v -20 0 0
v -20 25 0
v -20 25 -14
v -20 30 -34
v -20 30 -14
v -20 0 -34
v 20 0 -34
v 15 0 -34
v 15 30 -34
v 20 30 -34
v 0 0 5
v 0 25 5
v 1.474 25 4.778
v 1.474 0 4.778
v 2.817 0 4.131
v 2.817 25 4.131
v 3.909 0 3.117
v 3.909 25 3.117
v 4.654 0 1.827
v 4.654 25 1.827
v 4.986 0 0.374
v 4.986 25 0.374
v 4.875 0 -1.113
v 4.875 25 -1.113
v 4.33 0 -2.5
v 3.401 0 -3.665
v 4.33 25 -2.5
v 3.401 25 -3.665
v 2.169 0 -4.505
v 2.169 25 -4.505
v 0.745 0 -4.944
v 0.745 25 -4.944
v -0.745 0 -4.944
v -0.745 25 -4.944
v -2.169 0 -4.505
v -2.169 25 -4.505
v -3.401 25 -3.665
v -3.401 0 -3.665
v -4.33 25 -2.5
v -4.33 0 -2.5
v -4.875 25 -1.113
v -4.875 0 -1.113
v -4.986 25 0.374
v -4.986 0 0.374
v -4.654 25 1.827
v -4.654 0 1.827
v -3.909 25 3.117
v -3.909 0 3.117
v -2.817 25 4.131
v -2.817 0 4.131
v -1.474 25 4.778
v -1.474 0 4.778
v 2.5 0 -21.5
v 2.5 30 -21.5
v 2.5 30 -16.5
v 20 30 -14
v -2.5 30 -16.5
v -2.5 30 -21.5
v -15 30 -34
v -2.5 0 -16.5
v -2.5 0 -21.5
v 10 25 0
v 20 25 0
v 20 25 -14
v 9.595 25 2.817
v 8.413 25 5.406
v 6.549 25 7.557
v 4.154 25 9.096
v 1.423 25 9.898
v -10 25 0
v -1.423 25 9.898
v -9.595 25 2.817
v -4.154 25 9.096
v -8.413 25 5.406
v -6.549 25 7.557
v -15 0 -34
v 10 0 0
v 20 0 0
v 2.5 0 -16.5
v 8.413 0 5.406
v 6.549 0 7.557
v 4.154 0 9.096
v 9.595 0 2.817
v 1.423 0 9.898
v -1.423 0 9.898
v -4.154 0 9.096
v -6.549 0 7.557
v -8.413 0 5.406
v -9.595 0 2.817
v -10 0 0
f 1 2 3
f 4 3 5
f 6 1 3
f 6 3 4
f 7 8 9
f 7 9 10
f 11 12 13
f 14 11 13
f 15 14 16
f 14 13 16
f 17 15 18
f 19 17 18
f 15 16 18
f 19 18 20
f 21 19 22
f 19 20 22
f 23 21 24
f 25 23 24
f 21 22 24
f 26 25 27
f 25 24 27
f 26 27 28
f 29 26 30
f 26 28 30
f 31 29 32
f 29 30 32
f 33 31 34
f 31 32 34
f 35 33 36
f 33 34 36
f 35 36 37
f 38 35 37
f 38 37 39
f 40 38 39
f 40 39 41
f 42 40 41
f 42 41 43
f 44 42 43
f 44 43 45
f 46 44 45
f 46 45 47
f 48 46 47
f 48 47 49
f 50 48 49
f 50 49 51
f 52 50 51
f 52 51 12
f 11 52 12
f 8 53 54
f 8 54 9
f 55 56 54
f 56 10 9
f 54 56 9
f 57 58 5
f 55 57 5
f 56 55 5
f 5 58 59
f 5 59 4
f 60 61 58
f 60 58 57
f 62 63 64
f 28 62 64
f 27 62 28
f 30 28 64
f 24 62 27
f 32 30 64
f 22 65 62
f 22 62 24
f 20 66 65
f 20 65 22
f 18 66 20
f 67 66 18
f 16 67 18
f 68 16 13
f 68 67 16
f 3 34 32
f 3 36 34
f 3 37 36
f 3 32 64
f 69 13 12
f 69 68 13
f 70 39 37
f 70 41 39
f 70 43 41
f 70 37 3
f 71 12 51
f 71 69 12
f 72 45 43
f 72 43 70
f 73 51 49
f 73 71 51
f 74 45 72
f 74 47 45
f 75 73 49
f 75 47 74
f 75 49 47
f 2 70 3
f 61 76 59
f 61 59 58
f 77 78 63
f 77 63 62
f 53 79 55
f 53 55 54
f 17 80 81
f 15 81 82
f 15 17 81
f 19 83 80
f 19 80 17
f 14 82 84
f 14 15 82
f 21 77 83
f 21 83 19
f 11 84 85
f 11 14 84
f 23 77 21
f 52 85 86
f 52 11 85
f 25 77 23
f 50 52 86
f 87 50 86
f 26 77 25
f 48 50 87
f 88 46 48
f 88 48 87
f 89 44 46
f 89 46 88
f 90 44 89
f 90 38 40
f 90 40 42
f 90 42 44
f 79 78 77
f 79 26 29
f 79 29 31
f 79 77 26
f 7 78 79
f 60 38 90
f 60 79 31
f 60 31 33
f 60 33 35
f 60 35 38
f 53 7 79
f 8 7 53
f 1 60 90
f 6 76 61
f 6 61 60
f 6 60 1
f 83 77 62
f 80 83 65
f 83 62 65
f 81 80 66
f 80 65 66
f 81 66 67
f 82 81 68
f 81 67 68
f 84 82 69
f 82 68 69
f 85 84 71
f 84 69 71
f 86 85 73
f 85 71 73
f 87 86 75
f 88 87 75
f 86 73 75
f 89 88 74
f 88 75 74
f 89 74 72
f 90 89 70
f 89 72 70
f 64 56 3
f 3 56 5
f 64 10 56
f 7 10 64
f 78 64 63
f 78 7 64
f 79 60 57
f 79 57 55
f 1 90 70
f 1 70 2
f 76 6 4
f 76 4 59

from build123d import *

# Parameters (mm, degrees)
EXTRUDE_319_DEPTH   = 30
EXTRUDE_1_DEPTH     = 30
SKETCH_3_R          = 5
CUT_EXTRUDE_1_DEPTH = 50.558046773
CUT_EXTRUDE_2_DEPTH = 5


with BuildPart() as part:
    # Эскиз1 → Extrude 319 (new body)
    with BuildSketch(Plane(origin=(0, 0, 0), x_dir=(1, 0, 0), z_dir=(0, 1, 0))):
        Polygon((20, 0), (-20, 0), (-20, 34), (-15, 34), (-2.5, 21.5), (-2.5, 16.5), (2.5, 16.5), (2.5, 21.5), (15, 34), (20, 34), align=None)
    extrude(amount=EXTRUDE_319_DEPTH)

    # Эскиз2 → Бобышка-Вытянуть1 (add)
    with BuildSketch(Plane(origin=(0, 30, 0), x_dir=(-1, 0, 0), z_dir=(0, 1, 0))):
        with BuildLine():
            Line((10, 0), (-10, 0))
            ThreePointArc((-10, 0), (0, 10), (10, 0))
        make_face()
    extrude(amount=-EXTRUDE_1_DEPTH)

    # Эскиз3 → Вырез-Вытянуть1 (cut, through all)
    with BuildSketch(Plane(origin=(0, 30, 0), x_dir=(-1, 0, 0), z_dir=(0, 1, 0))):
        with Locations(Location((0, 0, 0), (0, 0, 90))):
            Circle(SKETCH_3_R)
    extrude(amount=-CUT_EXTRUDE_1_DEPTH, mode=Mode.SUBTRACT)

    # Эскиз4 → Вырез-Вытянуть2 (cut)
    with BuildSketch(Plane(origin=(0, 30, 0), x_dir=(-1, 0, 0), z_dir=(0, 1, 0))):
        with BuildLine():
            Line((-10, 0), (-20, 0))
            Line((-20, 0), (-20, -14))
            Line((-20, -14), (20, -14))
            Line((20, -14), (20, 0))
            Line((20, 0), (10, 0))
            ThreePointArc((10, 0), (0, 10), (-10, 0))
        make_face()
    extrude(amount=-CUT_EXTRUDE_2_DEPTH, mode=Mode.SUBTRACT)


solid = part.part
